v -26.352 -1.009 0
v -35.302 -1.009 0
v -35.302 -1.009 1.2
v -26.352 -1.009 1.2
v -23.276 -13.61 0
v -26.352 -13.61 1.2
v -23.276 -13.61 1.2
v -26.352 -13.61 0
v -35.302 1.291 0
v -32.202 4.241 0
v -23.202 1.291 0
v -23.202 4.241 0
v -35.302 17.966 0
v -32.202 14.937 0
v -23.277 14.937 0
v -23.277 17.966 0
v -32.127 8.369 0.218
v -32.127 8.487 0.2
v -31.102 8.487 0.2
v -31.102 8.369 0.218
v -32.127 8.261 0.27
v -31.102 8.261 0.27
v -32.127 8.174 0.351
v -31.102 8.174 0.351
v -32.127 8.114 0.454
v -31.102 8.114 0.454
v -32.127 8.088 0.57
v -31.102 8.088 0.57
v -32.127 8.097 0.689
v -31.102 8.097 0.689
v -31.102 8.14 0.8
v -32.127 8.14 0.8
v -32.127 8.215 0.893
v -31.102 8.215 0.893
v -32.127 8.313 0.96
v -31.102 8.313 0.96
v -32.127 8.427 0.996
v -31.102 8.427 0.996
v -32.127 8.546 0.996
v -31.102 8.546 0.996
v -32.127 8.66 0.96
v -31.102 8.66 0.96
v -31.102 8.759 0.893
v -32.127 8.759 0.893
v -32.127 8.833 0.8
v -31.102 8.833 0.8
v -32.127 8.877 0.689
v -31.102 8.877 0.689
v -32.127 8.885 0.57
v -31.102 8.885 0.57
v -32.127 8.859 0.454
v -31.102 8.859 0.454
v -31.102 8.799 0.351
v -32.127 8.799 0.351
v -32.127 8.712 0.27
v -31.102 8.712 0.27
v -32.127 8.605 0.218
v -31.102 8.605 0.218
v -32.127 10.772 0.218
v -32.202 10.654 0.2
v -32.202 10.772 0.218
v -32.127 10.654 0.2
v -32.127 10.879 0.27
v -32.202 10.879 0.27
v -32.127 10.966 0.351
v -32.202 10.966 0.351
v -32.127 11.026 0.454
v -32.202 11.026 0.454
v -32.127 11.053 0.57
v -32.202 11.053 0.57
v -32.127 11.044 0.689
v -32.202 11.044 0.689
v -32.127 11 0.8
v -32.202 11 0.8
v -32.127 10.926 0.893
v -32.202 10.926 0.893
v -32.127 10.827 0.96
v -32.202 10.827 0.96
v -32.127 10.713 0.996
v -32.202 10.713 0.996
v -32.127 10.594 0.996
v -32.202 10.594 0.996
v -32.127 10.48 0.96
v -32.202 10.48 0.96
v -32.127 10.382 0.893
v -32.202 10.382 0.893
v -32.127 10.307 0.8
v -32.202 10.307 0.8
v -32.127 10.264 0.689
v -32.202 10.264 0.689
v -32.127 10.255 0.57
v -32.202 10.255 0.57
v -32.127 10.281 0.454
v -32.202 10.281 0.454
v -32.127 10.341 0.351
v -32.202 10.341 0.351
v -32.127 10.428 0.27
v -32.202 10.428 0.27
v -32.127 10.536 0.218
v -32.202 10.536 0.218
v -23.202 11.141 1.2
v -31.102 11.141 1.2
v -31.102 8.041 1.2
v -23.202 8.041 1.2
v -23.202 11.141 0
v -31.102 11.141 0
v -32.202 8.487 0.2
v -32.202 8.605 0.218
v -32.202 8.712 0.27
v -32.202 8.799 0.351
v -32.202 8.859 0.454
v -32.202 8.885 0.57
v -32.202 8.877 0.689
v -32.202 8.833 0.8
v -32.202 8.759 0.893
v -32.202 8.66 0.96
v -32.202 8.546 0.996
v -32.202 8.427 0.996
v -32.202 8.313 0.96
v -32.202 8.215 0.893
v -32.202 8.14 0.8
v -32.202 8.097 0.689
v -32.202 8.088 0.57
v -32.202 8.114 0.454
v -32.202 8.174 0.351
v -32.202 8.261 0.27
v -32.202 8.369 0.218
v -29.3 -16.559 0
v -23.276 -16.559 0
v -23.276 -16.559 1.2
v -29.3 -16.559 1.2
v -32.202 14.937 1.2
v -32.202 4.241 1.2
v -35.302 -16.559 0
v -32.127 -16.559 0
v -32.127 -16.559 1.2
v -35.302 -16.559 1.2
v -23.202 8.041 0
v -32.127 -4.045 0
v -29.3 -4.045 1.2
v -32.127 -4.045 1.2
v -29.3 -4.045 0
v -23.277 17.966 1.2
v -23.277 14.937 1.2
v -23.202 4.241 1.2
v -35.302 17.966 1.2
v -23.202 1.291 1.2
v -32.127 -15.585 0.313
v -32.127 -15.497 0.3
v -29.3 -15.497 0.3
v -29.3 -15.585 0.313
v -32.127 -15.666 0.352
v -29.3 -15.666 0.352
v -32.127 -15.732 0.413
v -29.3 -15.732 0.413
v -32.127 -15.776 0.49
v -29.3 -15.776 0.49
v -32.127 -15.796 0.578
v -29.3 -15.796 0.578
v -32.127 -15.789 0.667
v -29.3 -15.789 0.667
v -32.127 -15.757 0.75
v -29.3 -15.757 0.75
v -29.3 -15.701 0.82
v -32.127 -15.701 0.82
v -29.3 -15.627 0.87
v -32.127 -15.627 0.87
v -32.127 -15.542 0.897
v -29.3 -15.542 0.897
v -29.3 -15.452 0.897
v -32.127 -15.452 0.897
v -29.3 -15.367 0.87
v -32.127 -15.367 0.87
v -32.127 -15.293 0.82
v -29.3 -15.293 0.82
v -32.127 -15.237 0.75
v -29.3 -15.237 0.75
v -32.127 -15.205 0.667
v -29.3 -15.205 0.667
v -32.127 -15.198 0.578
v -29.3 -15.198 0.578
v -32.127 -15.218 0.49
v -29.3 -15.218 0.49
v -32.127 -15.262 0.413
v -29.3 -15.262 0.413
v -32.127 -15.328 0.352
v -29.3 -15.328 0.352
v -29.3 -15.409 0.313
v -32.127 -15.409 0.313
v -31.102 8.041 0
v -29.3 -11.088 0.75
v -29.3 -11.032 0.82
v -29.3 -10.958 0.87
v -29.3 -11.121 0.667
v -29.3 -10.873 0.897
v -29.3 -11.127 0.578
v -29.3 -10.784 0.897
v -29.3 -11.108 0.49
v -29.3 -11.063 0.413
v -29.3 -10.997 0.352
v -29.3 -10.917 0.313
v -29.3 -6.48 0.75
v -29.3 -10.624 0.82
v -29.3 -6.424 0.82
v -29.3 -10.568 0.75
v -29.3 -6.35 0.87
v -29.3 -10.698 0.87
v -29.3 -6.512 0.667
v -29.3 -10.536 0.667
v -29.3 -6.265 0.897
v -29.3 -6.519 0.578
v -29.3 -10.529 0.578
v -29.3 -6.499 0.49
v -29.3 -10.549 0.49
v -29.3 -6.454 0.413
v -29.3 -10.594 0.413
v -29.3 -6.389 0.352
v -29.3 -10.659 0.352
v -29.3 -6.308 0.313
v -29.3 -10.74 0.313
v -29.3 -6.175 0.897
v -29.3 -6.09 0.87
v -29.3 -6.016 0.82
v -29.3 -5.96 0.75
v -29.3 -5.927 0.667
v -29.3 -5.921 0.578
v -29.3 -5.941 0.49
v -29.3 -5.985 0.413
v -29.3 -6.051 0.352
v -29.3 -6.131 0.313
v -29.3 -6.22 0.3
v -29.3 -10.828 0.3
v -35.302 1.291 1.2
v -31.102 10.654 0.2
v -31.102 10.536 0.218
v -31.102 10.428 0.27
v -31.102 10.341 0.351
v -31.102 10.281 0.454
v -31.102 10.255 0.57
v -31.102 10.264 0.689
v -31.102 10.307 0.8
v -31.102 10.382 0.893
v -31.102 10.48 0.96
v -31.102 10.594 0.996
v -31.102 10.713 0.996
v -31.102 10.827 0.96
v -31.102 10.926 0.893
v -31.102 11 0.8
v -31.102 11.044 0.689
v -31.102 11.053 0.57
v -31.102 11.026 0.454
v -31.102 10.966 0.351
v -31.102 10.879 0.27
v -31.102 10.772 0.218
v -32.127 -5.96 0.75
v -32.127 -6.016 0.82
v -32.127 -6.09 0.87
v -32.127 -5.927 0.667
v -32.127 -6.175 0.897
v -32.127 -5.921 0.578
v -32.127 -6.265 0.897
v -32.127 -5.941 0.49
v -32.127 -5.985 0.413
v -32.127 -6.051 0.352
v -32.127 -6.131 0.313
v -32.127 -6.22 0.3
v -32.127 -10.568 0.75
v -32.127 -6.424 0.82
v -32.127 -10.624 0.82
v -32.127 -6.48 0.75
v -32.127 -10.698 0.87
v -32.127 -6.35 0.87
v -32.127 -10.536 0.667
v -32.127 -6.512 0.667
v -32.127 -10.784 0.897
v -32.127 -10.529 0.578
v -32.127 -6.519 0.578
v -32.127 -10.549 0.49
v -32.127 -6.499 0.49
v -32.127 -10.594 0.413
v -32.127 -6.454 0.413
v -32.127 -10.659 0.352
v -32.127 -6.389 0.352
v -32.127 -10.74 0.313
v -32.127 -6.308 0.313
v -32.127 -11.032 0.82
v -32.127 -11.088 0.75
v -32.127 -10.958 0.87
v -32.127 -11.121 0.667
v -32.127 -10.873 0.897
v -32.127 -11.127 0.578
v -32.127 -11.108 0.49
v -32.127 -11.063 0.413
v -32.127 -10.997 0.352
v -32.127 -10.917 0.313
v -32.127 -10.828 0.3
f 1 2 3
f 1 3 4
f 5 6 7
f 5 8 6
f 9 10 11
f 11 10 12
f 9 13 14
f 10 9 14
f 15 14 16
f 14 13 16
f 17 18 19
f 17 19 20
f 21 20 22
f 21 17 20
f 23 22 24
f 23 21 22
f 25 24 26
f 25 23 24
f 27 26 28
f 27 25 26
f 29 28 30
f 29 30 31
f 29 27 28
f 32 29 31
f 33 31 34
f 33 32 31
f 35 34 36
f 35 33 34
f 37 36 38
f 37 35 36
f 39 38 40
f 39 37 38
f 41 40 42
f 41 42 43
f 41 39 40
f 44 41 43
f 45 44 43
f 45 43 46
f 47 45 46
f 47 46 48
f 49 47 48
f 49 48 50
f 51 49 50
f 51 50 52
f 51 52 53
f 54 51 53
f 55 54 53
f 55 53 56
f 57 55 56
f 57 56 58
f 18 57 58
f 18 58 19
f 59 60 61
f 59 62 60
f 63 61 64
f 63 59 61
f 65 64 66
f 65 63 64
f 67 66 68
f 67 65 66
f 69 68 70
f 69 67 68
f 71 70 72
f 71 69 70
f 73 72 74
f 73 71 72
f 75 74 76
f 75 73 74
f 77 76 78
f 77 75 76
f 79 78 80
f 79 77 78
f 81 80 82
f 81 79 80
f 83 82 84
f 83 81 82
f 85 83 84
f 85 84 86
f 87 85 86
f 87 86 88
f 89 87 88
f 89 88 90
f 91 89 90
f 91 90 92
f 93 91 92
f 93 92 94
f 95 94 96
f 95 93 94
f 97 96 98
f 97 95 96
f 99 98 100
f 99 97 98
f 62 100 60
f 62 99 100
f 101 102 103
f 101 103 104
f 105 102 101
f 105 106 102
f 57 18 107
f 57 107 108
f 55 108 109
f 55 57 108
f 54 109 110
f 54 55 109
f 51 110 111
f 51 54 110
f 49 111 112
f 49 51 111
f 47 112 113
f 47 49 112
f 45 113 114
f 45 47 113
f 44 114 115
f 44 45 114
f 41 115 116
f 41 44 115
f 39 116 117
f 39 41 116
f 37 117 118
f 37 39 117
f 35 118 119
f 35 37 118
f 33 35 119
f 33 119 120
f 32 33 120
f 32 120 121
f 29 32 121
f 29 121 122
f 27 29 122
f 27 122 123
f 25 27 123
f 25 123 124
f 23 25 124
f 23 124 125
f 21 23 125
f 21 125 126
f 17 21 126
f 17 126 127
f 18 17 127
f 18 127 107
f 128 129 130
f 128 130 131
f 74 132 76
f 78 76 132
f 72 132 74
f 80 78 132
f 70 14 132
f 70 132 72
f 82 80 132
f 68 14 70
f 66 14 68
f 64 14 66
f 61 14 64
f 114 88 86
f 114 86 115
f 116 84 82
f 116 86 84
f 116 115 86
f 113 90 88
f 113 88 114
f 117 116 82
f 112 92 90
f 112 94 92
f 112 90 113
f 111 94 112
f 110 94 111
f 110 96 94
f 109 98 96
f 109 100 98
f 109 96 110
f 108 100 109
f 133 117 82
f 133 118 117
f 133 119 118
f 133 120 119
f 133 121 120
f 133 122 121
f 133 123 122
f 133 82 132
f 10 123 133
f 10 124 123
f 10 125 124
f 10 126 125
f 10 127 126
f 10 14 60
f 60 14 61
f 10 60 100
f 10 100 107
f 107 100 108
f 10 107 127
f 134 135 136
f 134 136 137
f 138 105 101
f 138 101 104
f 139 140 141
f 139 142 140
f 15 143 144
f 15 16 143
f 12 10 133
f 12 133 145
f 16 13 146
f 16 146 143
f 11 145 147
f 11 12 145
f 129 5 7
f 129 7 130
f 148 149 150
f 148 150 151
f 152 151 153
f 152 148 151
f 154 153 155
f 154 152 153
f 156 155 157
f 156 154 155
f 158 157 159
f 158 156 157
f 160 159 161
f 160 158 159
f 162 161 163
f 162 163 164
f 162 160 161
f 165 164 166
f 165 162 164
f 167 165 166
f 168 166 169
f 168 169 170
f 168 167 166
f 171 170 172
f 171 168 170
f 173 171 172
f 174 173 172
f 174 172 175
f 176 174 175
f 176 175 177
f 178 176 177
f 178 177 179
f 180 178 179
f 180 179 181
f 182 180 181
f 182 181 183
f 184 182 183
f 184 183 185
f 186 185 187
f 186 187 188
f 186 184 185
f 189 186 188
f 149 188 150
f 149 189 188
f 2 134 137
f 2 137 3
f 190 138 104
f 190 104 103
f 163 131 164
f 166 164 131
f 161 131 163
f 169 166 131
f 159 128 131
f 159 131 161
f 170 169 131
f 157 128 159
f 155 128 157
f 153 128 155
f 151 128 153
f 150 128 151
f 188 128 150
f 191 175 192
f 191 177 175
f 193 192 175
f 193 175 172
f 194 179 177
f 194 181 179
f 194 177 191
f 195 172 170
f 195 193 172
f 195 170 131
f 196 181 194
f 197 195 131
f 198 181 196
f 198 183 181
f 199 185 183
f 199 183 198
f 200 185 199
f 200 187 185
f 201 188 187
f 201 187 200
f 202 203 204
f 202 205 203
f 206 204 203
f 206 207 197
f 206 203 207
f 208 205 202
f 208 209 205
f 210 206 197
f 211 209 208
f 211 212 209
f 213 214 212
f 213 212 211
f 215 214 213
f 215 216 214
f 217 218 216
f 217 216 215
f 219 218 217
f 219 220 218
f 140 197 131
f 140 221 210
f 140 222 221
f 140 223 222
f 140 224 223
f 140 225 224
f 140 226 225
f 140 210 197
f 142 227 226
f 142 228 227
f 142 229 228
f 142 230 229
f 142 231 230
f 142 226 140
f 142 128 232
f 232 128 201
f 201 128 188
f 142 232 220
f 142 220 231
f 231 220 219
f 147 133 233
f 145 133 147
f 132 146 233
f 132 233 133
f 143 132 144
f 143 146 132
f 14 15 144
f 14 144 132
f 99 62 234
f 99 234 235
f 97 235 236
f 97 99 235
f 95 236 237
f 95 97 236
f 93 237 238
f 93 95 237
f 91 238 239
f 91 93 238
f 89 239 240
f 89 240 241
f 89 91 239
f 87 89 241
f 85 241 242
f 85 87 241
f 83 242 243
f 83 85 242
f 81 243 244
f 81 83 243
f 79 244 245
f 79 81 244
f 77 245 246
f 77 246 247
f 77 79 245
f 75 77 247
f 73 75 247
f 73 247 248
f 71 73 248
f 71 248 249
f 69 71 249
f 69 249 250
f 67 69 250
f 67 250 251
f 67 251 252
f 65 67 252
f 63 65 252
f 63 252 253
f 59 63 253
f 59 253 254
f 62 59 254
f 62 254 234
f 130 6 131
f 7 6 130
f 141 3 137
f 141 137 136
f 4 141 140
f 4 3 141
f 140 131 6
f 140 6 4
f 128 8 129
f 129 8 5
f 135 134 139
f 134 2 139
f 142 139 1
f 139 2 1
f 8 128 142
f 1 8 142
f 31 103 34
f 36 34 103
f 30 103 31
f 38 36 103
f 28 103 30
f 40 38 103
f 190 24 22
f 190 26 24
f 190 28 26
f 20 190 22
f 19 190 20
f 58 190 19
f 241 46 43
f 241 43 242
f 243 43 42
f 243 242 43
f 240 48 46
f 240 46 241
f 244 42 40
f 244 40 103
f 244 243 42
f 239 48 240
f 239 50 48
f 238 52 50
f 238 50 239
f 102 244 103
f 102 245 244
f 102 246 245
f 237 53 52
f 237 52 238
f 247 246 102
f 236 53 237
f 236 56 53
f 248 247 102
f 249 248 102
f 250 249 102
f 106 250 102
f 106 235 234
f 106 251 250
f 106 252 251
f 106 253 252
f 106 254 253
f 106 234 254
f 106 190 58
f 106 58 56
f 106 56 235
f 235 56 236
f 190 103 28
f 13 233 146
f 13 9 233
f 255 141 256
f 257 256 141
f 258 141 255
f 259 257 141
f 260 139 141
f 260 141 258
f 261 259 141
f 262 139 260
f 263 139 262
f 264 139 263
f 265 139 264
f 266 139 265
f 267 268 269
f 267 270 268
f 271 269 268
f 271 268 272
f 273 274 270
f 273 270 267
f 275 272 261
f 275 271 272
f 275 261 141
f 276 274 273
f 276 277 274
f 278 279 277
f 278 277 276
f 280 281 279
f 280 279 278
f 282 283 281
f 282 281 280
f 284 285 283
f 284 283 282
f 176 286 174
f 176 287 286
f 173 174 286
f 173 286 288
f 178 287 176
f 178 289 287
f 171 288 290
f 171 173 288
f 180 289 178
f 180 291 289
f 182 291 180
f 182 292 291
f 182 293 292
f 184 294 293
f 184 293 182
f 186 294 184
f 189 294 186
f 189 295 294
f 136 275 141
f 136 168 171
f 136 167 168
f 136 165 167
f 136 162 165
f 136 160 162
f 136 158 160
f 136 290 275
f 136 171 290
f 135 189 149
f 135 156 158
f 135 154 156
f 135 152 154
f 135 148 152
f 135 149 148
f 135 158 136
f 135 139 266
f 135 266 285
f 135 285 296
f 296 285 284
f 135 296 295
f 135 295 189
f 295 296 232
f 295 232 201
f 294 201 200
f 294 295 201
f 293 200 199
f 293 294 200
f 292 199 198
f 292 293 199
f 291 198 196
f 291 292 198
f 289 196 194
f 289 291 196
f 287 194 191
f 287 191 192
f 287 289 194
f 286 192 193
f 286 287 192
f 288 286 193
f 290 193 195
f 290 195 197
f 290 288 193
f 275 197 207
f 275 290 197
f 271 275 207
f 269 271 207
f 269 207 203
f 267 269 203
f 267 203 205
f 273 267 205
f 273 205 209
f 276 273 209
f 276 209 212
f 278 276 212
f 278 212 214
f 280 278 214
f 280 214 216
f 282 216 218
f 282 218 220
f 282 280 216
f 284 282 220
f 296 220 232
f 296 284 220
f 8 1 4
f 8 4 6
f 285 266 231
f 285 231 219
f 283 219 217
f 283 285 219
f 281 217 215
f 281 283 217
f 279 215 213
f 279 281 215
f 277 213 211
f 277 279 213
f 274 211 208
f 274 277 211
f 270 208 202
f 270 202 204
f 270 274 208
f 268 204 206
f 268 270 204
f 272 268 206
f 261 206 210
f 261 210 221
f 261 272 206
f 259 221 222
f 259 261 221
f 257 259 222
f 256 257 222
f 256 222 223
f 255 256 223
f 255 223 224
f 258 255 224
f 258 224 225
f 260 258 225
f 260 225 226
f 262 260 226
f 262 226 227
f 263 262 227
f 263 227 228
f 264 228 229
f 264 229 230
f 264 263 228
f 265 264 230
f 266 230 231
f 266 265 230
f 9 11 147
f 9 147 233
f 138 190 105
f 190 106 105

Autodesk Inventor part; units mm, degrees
ref_plane "YZ Plane" through (0, 0, 0) normal (1, 0, 0) x (0, 1, 0)
ref_plane "XZ Plane" through (0, 0, 0) normal (0, 1, 0) x (-1, 0, 0)
ref_plane "XY Plane" through (0, 0, 0) normal (0, 0, 1) x (1, 0, 0)
sketch "Sketch1" plane through (0, 0, 0) normal (0, 0, 1) x (1, 0, 0)
  line L0 (-26.5523, -13.8097) -> (-23.4761, -13.8097) construction
  line L1 (-26.5523, -1.2089) -> (-26.5523, -13.8097) construction
  line L2 (-35.1023, -1.2089) -> (-26.5523, -1.2089) construction
  line L3 (-35.1023, -16.3589) -> (-35.1023, -1.2089) construction
  line L4 (-32.3273, -16.3589) -> (-35.1023, -16.3589) construction
  line L5 (-32.3273, -3.8452) -> (-32.3273, -16.3589) construction
  line L6 (-29.0999, -3.8452) -> (-32.3273, -3.8452) construction
  line L7 (-29.0999, -16.3589) -> (-29.0999, -3.8452) construction
  line L8 (-23.4761, -16.3589) -> (-29.0999, -16.3589) construction
  line L9 (-23.4761, -13.8097) -> (-23.4761, -16.3589) construction
  line L10 (-32.4023, 4.0411) -> (-23.4023, 4.0411) construction
  line L11 (-32.4023, 15.1366) -> (-32.4023, 4.0411) construction
  line L12 (-23.4769, 15.1366) -> (-32.4023, 15.1366) construction
  line L13 (-23.4769, 17.7661) -> (-23.4769, 15.1366) construction
  line L14 (-35.1023, 17.7661) -> (-23.4769, 17.7661) construction
  line L15 (-35.1023, 1.4911) -> (-35.1023, 17.7661) construction
  line L16 (-23.4023, 1.4911) -> (-35.1023, 1.4911) construction
  line L17 (-23.4023, 4.0411) -> (-23.4023, 1.4911) construction
  line L18 (-30.9023, 8.2411) -> (-30.9023, 10.9411) construction
  line L19 (-23.4023, 8.2411) -> (-30.9023, 8.2411) construction
  line L20 (-23.4023, 10.9411) -> (-23.4023, 8.2411) construction
  line L21 (-30.9023, 10.9411) -> (-23.4023, 10.9411) construction
  line L22 (-23.2769, 17.9661) -> (-23.2769, 14.9366)
  line L23 (-23.2769, 14.9366) -> (-32.2023, 14.9366)
  line L24 (-32.2023, 14.9366) -> (-32.2023, 4.2411)
  line L25 (-32.2023, 4.2411) -> (-23.2023, 4.2411)
  line L26 (-23.2023, 4.2411) -> (-23.2023, 1.2911)
  line L27 (-23.2023, 1.2911) -> (-35.3023, 1.2911)
  line L28 (-35.3023, 1.2911) -> (-35.3023, 17.9661)
  line L29 (-35.3023, 17.9661) -> (-23.2769, 17.9661)
  line L30 (-23.2023, 11.1411) -> (-23.2023, 8.0411)
  line L31 (-23.2023, 8.0411) -> (-31.1023, 8.0411)
  line L32 (-31.1023, 8.0411) -> (-31.1023, 11.1411)
  line L33 (-31.1023, 11.1411) -> (-23.2023, 11.1411)
  line L34 (-29.2999, -4.0452) -> (-32.1273, -4.0452)
  line L35 (-32.1273, -4.0452) -> (-32.1273, -16.5589)
  line L36 (-32.1273, -16.5589) -> (-35.3023, -16.5589)
  line L37 (-35.3023, -16.5589) -> (-35.3023, -1.0089)
  line L38 (-35.3023, -1.0089) -> (-26.3523, -1.0089)
  line L39 (-26.3523, -1.0089) -> (-26.3523, -13.6097)
  line L40 (-26.3523, -13.6097) -> (-23.2761, -13.6097)
  line L41 (-23.2761, -13.6097) -> (-23.2761, -16.5589)
  line L42 (-23.2761, -16.5589) -> (-29.2999, -16.5589)
  line L43 (-29.2999, -16.5589) -> (-29.2999, -4.0452)
  point P0 (0, 0)
  dimension "d2" = 0.2
  dimension "d3" = 0.2
  dimension "d4" = 0.2
extrude "Extrusion1" add sketch "Sketch1" along normal blind 1.2
sketch "Sketch2" plane through (-32.1273, -16.5589, 0) normal (1, 0, 0) x (0, 0, -1)
  line L0 (0, 0) -> (0, 12.5137) projected
  line L1 (0, 12.5137) -> (-1.2, 12.5137) projected
  line L2 (-1.2, 0) -> (-1.2, 12.5137) projected
  line L3 (0, 0) -> (-1.2, 0) projected
  line L4 (0, 24.6) -> (0, 27.7) projected
  line L5 (0, 27.7) -> (-1.2, 27.7) projected
  line L6 (-1.2, 24.6) -> (-1.2, 27.7) projected
  line L7 (0, 24.6) -> (-1.2, 24.6) projected
  circle A0 centre (-0.6, 1.0619) radius 0.3
  circle A1 centre (-0.6, 10.3391) radius 0.3
  circle A2 centre (-0.6, 5.7306) radius 0.3
  circle A3 centre (-0.6, 27.2126) radius 0.4
  circle A4 centre (-0.6, 25.0455) radius 0.4
  point P0 (0, 16.5589)
  dimension "d5" = 0.6
  dimension "d6" = 0.6
  dimension "d7" = 0.6
  dimension "d8" = 0.8
  dimension "d9" = 0.8
extrude "Extrusion2" add sketch "Sketch2" along normal blind 4 and the other way blind 2 contours A0 | A1 | A2 | A3 | A4
properties part number "ROBOILO LOGO"
